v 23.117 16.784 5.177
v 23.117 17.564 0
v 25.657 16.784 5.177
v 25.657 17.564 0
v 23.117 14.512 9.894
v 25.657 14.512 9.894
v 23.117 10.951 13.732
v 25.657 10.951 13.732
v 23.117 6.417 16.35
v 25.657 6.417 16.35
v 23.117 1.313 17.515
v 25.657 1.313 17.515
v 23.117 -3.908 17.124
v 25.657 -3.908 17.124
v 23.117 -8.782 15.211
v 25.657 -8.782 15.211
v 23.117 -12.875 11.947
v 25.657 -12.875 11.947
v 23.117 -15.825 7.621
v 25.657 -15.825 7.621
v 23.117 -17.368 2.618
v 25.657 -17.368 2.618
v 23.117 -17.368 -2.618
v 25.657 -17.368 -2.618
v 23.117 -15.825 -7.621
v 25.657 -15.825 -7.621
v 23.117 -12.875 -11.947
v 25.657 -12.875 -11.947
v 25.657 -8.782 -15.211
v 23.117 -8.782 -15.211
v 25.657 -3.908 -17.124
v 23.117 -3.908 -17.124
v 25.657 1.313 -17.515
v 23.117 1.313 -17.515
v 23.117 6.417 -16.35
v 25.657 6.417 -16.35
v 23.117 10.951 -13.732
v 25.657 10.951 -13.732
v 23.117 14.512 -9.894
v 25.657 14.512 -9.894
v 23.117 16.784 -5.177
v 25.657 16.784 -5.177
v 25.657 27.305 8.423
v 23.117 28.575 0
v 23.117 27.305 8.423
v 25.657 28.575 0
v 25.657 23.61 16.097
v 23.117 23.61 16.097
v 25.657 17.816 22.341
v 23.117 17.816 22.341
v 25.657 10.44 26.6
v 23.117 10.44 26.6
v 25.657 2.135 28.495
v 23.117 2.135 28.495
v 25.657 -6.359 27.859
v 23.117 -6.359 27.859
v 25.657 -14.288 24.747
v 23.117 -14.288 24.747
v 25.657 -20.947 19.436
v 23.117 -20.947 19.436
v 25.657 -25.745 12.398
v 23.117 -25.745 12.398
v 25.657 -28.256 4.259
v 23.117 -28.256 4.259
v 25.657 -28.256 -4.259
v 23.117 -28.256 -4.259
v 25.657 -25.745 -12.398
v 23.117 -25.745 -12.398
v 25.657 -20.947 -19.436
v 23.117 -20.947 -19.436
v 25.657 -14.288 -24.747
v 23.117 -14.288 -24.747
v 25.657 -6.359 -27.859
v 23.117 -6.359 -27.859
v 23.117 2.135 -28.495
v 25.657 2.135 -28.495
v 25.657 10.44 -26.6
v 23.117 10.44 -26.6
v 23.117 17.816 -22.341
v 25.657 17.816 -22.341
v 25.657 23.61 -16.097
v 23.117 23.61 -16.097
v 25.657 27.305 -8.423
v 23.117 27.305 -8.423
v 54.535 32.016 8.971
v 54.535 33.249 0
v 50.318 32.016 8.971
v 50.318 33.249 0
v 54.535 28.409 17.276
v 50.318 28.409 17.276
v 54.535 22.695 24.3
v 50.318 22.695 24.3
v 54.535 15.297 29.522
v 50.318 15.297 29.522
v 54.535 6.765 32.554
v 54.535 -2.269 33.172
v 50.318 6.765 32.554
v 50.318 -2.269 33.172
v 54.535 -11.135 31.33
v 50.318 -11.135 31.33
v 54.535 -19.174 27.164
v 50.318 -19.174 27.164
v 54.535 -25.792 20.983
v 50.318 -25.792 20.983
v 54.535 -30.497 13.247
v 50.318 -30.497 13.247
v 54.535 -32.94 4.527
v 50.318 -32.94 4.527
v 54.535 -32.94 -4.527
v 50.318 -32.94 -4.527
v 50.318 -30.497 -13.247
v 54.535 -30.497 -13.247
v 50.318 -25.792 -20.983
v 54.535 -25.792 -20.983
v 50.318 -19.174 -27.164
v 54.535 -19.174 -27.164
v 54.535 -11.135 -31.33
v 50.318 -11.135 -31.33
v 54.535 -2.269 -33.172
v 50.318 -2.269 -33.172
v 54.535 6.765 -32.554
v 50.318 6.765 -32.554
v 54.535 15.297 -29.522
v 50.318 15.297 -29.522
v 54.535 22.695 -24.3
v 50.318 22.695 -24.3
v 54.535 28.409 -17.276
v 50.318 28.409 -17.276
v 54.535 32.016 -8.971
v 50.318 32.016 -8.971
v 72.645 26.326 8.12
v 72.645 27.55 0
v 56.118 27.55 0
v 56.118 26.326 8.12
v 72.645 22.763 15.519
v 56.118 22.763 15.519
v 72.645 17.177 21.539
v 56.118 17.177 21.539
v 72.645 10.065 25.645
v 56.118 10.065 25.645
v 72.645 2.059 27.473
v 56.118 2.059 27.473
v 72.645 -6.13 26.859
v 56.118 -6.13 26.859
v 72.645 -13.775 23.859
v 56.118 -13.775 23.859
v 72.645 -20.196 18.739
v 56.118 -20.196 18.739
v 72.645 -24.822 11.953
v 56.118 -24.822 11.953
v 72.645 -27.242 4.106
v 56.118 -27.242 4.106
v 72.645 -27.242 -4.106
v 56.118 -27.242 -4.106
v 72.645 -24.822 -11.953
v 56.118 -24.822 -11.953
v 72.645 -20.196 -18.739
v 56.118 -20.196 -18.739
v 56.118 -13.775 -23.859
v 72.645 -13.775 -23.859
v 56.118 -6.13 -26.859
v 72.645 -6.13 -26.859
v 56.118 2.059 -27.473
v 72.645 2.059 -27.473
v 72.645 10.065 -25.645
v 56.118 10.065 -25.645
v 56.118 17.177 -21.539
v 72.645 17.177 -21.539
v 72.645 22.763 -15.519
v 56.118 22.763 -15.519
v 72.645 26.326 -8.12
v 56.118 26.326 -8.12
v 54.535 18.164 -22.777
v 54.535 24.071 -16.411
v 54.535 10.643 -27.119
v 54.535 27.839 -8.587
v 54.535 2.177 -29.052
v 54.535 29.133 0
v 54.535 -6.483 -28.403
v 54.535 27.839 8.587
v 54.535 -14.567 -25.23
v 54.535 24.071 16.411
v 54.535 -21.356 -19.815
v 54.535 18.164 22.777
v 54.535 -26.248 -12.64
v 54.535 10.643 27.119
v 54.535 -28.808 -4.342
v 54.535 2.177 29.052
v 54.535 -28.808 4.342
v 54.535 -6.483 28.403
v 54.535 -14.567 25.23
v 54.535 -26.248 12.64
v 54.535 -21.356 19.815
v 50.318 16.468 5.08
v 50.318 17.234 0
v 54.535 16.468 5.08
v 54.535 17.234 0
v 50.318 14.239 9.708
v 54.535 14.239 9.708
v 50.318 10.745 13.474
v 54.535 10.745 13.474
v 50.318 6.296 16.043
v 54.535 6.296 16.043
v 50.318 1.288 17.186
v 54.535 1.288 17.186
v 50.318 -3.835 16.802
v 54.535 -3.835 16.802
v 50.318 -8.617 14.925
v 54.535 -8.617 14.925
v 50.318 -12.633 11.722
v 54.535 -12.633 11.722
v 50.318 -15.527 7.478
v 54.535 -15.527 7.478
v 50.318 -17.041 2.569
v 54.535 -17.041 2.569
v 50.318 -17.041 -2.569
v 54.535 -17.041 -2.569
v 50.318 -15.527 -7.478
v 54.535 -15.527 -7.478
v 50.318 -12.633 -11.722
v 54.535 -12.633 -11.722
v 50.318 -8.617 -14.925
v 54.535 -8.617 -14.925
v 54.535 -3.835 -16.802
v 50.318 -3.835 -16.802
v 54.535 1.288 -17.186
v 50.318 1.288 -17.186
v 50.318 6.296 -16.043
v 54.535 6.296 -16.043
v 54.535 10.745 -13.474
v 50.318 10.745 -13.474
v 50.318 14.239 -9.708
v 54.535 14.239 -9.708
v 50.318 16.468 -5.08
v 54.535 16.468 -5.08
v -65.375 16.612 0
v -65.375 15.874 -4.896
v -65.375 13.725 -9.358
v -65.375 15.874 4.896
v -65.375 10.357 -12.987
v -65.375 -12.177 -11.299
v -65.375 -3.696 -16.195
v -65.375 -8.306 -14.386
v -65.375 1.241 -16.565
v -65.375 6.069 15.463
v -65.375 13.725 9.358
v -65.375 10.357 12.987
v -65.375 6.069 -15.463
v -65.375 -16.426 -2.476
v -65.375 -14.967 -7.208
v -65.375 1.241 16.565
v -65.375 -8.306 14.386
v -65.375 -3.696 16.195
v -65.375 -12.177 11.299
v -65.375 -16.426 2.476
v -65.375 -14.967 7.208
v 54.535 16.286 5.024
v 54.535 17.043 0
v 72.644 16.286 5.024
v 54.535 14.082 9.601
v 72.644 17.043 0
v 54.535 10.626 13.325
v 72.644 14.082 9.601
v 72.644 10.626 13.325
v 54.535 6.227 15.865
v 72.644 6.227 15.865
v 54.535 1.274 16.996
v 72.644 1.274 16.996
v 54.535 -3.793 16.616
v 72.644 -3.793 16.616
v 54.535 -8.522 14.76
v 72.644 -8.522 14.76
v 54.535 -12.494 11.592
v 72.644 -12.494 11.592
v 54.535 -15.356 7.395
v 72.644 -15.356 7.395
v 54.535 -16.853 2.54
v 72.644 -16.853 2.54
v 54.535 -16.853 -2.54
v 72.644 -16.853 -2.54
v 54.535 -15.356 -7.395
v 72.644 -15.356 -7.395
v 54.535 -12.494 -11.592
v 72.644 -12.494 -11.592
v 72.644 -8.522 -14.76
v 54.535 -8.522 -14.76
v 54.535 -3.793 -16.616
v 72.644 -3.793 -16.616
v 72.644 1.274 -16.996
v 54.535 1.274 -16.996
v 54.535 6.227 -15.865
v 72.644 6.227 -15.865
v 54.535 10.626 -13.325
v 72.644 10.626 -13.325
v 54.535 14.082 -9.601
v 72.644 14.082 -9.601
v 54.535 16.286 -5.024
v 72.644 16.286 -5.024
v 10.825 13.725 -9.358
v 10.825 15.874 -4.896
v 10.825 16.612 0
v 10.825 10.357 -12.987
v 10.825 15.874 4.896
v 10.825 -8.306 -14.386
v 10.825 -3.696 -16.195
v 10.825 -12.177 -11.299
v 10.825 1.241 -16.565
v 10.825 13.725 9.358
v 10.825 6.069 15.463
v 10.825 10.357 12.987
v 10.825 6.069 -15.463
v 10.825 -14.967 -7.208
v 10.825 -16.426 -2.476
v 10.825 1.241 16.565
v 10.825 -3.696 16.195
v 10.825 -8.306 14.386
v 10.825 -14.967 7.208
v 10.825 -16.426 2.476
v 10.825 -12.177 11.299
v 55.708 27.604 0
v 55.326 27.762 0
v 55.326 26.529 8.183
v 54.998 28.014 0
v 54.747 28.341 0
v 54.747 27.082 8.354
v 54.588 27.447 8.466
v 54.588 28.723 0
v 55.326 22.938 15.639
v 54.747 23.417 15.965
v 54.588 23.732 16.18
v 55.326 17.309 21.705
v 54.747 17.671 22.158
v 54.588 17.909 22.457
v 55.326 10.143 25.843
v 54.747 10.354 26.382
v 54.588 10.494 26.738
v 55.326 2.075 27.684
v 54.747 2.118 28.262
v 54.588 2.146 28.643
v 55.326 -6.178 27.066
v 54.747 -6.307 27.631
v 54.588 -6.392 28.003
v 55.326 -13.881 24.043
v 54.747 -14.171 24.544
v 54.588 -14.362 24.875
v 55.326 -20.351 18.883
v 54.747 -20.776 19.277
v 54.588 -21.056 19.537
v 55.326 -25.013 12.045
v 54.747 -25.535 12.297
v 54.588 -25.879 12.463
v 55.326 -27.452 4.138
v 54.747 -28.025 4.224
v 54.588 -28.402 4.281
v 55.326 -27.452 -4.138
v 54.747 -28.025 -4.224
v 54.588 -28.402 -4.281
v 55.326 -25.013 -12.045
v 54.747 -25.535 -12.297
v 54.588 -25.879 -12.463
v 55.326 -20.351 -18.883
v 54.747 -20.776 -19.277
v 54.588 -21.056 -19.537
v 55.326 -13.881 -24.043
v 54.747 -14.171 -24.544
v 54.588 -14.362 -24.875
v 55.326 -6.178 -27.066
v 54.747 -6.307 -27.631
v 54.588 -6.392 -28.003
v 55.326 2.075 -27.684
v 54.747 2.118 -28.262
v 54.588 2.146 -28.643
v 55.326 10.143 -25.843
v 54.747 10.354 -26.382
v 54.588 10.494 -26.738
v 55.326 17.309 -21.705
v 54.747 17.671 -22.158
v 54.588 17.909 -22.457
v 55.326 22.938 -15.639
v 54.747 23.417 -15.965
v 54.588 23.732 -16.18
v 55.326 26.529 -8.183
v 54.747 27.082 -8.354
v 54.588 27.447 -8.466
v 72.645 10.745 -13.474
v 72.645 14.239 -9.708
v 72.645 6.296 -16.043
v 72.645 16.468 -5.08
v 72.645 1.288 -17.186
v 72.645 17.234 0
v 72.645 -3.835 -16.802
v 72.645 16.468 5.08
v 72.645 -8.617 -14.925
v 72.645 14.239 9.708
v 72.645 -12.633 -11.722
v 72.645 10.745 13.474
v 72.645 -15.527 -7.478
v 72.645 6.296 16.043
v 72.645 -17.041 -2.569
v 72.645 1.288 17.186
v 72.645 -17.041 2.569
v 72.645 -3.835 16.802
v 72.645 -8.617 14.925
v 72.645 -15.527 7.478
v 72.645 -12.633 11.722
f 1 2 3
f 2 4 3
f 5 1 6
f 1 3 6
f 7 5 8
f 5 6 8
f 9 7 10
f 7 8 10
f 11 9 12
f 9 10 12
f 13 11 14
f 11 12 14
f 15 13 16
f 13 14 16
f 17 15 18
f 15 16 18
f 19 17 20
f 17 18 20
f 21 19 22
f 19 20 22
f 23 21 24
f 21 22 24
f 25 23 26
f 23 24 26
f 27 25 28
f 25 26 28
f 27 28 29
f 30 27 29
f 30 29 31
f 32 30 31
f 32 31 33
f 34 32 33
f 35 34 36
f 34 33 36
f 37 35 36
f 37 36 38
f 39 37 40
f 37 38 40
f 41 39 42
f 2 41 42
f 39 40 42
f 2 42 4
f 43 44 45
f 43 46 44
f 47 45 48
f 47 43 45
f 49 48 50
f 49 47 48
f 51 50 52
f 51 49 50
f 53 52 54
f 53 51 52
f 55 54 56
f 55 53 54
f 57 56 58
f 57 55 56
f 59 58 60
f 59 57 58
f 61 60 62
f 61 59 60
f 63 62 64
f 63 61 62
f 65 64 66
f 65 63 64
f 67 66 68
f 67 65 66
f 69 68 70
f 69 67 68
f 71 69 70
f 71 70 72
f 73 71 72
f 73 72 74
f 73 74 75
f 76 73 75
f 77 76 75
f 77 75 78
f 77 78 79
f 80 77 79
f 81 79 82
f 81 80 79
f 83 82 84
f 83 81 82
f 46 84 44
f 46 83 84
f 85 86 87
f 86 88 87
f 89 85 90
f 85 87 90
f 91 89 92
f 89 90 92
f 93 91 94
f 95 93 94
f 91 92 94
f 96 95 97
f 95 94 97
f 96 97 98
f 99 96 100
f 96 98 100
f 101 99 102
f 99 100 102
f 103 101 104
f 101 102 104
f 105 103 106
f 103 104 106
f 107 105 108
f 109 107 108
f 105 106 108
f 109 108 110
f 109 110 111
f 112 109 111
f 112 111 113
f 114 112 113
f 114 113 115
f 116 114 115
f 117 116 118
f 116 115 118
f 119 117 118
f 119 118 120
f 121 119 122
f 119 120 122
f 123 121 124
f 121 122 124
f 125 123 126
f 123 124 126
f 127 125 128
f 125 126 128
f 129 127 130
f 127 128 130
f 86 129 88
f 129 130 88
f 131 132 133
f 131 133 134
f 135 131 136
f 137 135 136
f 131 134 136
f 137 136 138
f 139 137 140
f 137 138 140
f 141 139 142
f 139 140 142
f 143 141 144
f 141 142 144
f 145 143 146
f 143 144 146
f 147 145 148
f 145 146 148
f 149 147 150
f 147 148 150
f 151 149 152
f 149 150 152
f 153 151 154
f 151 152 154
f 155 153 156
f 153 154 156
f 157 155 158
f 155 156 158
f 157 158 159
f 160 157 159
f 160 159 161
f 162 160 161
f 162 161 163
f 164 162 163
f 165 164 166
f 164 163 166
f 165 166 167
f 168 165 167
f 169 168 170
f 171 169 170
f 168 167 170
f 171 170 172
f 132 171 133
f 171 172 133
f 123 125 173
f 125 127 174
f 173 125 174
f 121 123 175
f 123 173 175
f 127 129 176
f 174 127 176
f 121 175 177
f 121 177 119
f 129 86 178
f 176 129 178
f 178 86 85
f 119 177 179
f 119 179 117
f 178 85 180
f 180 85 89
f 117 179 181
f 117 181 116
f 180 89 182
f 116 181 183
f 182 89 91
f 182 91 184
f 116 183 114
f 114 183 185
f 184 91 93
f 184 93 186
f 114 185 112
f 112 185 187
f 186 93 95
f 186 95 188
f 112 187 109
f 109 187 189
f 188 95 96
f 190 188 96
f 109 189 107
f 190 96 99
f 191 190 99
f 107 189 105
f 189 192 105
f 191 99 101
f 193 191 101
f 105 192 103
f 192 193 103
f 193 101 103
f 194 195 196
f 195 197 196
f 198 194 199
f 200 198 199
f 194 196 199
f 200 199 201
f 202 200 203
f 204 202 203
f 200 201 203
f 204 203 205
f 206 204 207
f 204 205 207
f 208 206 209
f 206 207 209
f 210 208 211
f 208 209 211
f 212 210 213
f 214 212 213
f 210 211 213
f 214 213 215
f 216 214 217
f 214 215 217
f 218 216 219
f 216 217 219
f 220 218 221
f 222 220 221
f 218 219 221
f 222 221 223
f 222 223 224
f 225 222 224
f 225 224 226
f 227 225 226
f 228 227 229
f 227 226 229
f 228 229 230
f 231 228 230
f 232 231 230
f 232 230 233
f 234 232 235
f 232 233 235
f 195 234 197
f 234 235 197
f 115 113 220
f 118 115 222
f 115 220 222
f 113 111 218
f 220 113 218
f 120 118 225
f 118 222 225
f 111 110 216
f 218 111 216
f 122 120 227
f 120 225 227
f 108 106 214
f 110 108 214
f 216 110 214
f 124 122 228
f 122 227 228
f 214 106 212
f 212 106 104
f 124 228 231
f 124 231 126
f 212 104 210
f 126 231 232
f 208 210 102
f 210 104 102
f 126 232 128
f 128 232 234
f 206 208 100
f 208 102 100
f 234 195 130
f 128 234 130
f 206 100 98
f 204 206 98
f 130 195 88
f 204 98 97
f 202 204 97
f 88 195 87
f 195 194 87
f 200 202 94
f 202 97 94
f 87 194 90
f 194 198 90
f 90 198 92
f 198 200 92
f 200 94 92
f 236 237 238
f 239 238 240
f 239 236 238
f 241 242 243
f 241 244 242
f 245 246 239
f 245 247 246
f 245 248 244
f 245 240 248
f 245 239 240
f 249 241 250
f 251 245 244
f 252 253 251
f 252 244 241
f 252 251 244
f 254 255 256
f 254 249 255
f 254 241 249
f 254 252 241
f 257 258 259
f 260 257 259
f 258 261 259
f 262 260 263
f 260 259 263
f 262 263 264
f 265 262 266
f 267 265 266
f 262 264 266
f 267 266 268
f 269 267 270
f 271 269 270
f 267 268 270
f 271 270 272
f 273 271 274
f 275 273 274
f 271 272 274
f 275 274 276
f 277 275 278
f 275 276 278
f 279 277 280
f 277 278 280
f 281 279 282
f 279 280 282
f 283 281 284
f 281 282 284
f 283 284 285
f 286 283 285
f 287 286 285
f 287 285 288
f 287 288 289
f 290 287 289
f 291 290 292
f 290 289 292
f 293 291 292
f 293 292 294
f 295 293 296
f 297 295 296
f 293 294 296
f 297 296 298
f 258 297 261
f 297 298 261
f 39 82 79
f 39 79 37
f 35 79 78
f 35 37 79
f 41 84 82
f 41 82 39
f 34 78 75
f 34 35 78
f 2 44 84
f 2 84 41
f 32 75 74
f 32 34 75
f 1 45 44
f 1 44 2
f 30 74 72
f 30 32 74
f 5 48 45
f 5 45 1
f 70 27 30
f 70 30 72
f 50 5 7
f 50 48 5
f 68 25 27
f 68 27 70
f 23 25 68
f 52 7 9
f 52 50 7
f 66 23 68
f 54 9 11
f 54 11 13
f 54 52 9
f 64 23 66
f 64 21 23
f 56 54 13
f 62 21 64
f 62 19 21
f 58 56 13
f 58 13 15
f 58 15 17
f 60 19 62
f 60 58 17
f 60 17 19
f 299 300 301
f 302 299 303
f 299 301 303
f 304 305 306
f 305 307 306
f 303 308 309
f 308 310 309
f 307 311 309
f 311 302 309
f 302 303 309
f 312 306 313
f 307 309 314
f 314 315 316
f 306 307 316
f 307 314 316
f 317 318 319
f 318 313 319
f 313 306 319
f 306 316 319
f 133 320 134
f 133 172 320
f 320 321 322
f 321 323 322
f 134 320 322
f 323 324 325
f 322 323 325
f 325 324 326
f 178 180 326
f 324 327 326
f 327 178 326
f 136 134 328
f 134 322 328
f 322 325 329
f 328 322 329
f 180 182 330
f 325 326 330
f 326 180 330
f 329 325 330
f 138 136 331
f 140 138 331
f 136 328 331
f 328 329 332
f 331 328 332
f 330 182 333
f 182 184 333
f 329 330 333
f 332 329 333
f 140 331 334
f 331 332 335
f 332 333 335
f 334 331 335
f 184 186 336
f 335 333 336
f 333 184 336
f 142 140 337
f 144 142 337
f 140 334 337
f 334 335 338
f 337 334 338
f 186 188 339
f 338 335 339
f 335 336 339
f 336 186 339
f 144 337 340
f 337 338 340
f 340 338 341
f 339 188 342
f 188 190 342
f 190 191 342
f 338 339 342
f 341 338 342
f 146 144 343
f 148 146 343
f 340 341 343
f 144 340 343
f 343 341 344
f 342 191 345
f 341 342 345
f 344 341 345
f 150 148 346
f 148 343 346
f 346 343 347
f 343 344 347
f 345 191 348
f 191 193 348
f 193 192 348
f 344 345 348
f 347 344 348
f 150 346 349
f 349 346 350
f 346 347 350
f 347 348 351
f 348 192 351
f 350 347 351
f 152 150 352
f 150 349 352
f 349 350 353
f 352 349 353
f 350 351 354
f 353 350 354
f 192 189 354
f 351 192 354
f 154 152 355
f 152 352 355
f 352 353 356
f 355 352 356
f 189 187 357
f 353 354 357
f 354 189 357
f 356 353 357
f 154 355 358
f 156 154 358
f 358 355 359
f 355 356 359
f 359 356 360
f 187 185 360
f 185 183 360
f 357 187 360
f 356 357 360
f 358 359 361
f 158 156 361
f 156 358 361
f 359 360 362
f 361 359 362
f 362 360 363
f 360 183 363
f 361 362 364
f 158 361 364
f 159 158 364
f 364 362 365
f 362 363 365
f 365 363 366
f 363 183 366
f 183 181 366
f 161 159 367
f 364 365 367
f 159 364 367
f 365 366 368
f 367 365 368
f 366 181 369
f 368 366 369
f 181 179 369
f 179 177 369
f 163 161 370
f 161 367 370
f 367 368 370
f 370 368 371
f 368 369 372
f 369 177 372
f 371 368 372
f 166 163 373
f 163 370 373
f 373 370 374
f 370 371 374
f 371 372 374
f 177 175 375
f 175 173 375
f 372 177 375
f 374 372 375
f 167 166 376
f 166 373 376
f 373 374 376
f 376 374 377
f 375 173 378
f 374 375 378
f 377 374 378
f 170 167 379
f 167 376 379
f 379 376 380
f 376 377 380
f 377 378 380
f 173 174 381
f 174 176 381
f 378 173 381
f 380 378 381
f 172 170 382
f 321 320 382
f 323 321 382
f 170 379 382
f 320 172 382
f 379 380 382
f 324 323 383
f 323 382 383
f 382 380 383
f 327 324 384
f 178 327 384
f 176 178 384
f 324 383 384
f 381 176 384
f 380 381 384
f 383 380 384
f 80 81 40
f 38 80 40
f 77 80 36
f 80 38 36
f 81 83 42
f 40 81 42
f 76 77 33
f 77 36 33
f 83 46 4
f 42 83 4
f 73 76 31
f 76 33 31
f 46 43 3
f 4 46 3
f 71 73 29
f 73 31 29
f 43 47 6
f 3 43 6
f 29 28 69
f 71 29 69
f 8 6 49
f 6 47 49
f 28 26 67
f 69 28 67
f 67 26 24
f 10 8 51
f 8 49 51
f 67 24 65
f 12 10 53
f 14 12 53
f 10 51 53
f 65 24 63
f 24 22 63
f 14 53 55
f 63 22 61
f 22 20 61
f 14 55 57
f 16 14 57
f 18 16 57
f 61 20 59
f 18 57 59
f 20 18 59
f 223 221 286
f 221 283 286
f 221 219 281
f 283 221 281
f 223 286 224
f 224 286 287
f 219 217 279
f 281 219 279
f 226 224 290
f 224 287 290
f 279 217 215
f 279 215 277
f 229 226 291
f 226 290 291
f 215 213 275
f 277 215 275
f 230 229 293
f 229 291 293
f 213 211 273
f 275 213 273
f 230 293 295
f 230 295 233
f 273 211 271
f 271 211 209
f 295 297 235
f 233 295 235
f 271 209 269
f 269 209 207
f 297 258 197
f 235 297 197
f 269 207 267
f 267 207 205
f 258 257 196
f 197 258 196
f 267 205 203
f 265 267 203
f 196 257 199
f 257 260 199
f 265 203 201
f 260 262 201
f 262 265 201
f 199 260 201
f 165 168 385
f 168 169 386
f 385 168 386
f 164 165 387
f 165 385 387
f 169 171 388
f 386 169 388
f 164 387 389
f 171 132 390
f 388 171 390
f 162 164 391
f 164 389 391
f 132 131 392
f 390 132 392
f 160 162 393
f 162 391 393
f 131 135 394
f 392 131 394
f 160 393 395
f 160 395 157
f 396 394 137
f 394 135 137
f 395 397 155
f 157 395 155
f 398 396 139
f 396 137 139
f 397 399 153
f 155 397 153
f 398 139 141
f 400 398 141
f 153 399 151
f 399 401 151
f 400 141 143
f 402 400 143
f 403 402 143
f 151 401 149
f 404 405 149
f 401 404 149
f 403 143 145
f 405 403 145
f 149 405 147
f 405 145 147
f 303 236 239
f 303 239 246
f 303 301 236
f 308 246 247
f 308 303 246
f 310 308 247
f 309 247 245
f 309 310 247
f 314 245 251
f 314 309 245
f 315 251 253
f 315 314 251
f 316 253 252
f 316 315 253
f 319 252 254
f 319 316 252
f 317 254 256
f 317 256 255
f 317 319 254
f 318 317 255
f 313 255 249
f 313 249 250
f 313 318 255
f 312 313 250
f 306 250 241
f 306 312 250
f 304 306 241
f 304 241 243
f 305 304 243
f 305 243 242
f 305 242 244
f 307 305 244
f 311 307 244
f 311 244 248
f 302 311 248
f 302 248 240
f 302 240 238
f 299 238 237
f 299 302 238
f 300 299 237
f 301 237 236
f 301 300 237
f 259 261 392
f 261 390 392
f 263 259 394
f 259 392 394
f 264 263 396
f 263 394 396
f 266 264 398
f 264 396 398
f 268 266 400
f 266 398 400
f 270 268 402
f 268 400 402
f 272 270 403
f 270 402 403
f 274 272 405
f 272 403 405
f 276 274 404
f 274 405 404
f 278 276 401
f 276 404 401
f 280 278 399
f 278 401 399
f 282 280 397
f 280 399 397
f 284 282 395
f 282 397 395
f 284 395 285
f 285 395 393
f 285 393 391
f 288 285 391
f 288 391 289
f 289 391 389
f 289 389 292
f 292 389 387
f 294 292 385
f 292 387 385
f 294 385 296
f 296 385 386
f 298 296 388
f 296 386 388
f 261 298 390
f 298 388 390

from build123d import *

# Parameters (mm, degrees)
F0_W   = 76.2
F0_H   = 16.6116
F0_W_2 = 2.54
F0_H_2 = 11.0109


with BuildPart() as f1:
    # F0 (on Top) → F1 (revolve)
    with BuildSketch(Plane.XY):
        with Locations((-27.274685, 8.3058)):
            Rectangle(F0_W, F0_H)
        with Locations((24.386736, 23.06955)):
            Rectangle(F0_W_2, F0_H_2)
        with BuildLine():
            Line((50.318114, 33.249445), (50.318114, 17.2339))
            Line((50.318114, 17.2339), (54.534514, 17.2339))
            Line((54.534514, 17.2339), (54.534514, 17.0434))
            Line((54.534514, 17.0434), (63.044108, 17.0434))
            Line((63.044108, 17.0434), (72.644323, 17.0434))
            Line((72.644323, 17.0434), (72.644714, 17.2339))
            Line((72.644714, 17.2339), (72.644714, 27.549917))
            Line((72.644714, 27.549917), (56.11763, 27.549917))
            ThreePointArc((56.11763, 27.549917), (54.998198, 28.013601), (54.534514, 29.133032))
            Line((54.534514, 29.133032), (54.534514, 33.249445))
            Line((54.534514, 33.249445), (50.318114, 33.249445))
        make_face()
    revolve(axis=Axis((0.35724, 0, 0), (1, 0, 0)))


solid = f1.part
